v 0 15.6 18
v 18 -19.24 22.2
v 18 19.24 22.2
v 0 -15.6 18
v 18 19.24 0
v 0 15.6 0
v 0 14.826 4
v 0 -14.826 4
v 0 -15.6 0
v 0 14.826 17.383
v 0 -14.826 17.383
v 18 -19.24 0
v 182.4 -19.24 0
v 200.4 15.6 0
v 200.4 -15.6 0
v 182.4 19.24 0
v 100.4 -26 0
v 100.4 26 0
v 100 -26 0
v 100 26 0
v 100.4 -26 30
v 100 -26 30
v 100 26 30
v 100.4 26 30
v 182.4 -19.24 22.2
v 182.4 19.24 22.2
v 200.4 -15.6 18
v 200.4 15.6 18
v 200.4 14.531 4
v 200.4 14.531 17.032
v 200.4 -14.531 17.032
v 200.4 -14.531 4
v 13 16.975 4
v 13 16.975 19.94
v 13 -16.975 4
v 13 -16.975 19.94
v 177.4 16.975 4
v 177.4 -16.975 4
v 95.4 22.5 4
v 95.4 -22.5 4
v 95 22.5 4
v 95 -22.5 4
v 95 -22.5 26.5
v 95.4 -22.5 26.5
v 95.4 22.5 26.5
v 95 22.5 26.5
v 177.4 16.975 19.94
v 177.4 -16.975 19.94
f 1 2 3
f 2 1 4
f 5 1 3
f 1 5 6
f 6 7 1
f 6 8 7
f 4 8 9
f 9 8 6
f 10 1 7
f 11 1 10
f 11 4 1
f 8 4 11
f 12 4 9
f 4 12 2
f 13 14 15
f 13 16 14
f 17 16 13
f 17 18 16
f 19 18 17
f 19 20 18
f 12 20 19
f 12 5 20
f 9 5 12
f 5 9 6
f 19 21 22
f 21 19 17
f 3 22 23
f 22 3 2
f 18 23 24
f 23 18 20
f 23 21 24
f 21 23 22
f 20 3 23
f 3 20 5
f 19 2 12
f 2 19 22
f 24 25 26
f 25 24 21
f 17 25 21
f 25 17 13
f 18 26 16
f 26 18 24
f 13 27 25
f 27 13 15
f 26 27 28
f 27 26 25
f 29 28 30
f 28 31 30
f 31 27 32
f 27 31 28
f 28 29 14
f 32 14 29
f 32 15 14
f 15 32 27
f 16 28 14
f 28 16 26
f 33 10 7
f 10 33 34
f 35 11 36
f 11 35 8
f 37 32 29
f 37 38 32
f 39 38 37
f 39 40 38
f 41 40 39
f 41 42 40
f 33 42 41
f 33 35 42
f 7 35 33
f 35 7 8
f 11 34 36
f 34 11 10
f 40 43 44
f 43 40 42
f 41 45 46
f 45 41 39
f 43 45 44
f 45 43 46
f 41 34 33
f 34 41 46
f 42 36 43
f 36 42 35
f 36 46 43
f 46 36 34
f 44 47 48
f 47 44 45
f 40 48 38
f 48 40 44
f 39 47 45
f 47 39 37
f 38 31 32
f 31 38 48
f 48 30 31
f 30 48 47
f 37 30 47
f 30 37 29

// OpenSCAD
$fn = 32;

// ----------------------------------------------------------------------
// Faired channel: 200 x 52 x 30 mm, 3.5 mm walls, faired ends
// ----------------------------------------------------------------------

// --- parameters (mm) ---
length = 200;             // channel length
width = 52;               // channel width at mid length
height = 30;              // channel height at mid length
wall = 3.5;               // side wall thickness
floor_t = 4;              // floor thickness
end_w = 31.2;             // faired end width
end_h = 18;               // faired end height

difference() {
  union() {
    hull() {
      translate([0, -15.6, 0]) cube([0.4, 31.2, 18]);
      translate([18, -19.24, 0]) cube([0.4, 38.48, 22.2]);
    }
    hull() {
      translate([18, -19.24, 0]) cube([0.4, 38.48, 22.2]);
      translate([100, -26, 0]) cube([0.4, 52, 30]);
    }
    hull() {
      translate([100, -26, 0]) cube([0.4, 52, 30]);
      translate([182, -19.24, 0]) cube([0.4, 38.48, 22.2]);
    }
    hull() {
      translate([182, -19.24, 0]) cube([0.4, 38.48, 22.2]);
      translate([200, -15.6, 0]) cube([0.4, 31.2, 18]);
    }
  }
  /* cavity, 5 mm proud of both ends so the ports are cut clean */
  hull() {
    translate([-5, -14, 4]) cube([0.4, 28, 12.4]);
    translate([13, -16.975, 4]) cube([0.4, 33.95, 15.94]);
  }
  hull() {
    translate([13, -16.975, 4]) cube([0.4, 33.95, 15.94]);
    translate([95, -22.5, 4]) cube([0.4, 45, 22.5]);
  }
  hull() {
    translate([95, -22.5, 4]) cube([0.4, 45, 22.5]);
    translate([177, -16.975, 4]) cube([0.4, 33.95, 15.94]);
  }
  hull() {
    translate([177, -16.975, 4]) cube([0.4, 33.95, 15.94]);
    translate([205, -14, 4]) cube([0.4, 28, 12.4]);
  }
}
